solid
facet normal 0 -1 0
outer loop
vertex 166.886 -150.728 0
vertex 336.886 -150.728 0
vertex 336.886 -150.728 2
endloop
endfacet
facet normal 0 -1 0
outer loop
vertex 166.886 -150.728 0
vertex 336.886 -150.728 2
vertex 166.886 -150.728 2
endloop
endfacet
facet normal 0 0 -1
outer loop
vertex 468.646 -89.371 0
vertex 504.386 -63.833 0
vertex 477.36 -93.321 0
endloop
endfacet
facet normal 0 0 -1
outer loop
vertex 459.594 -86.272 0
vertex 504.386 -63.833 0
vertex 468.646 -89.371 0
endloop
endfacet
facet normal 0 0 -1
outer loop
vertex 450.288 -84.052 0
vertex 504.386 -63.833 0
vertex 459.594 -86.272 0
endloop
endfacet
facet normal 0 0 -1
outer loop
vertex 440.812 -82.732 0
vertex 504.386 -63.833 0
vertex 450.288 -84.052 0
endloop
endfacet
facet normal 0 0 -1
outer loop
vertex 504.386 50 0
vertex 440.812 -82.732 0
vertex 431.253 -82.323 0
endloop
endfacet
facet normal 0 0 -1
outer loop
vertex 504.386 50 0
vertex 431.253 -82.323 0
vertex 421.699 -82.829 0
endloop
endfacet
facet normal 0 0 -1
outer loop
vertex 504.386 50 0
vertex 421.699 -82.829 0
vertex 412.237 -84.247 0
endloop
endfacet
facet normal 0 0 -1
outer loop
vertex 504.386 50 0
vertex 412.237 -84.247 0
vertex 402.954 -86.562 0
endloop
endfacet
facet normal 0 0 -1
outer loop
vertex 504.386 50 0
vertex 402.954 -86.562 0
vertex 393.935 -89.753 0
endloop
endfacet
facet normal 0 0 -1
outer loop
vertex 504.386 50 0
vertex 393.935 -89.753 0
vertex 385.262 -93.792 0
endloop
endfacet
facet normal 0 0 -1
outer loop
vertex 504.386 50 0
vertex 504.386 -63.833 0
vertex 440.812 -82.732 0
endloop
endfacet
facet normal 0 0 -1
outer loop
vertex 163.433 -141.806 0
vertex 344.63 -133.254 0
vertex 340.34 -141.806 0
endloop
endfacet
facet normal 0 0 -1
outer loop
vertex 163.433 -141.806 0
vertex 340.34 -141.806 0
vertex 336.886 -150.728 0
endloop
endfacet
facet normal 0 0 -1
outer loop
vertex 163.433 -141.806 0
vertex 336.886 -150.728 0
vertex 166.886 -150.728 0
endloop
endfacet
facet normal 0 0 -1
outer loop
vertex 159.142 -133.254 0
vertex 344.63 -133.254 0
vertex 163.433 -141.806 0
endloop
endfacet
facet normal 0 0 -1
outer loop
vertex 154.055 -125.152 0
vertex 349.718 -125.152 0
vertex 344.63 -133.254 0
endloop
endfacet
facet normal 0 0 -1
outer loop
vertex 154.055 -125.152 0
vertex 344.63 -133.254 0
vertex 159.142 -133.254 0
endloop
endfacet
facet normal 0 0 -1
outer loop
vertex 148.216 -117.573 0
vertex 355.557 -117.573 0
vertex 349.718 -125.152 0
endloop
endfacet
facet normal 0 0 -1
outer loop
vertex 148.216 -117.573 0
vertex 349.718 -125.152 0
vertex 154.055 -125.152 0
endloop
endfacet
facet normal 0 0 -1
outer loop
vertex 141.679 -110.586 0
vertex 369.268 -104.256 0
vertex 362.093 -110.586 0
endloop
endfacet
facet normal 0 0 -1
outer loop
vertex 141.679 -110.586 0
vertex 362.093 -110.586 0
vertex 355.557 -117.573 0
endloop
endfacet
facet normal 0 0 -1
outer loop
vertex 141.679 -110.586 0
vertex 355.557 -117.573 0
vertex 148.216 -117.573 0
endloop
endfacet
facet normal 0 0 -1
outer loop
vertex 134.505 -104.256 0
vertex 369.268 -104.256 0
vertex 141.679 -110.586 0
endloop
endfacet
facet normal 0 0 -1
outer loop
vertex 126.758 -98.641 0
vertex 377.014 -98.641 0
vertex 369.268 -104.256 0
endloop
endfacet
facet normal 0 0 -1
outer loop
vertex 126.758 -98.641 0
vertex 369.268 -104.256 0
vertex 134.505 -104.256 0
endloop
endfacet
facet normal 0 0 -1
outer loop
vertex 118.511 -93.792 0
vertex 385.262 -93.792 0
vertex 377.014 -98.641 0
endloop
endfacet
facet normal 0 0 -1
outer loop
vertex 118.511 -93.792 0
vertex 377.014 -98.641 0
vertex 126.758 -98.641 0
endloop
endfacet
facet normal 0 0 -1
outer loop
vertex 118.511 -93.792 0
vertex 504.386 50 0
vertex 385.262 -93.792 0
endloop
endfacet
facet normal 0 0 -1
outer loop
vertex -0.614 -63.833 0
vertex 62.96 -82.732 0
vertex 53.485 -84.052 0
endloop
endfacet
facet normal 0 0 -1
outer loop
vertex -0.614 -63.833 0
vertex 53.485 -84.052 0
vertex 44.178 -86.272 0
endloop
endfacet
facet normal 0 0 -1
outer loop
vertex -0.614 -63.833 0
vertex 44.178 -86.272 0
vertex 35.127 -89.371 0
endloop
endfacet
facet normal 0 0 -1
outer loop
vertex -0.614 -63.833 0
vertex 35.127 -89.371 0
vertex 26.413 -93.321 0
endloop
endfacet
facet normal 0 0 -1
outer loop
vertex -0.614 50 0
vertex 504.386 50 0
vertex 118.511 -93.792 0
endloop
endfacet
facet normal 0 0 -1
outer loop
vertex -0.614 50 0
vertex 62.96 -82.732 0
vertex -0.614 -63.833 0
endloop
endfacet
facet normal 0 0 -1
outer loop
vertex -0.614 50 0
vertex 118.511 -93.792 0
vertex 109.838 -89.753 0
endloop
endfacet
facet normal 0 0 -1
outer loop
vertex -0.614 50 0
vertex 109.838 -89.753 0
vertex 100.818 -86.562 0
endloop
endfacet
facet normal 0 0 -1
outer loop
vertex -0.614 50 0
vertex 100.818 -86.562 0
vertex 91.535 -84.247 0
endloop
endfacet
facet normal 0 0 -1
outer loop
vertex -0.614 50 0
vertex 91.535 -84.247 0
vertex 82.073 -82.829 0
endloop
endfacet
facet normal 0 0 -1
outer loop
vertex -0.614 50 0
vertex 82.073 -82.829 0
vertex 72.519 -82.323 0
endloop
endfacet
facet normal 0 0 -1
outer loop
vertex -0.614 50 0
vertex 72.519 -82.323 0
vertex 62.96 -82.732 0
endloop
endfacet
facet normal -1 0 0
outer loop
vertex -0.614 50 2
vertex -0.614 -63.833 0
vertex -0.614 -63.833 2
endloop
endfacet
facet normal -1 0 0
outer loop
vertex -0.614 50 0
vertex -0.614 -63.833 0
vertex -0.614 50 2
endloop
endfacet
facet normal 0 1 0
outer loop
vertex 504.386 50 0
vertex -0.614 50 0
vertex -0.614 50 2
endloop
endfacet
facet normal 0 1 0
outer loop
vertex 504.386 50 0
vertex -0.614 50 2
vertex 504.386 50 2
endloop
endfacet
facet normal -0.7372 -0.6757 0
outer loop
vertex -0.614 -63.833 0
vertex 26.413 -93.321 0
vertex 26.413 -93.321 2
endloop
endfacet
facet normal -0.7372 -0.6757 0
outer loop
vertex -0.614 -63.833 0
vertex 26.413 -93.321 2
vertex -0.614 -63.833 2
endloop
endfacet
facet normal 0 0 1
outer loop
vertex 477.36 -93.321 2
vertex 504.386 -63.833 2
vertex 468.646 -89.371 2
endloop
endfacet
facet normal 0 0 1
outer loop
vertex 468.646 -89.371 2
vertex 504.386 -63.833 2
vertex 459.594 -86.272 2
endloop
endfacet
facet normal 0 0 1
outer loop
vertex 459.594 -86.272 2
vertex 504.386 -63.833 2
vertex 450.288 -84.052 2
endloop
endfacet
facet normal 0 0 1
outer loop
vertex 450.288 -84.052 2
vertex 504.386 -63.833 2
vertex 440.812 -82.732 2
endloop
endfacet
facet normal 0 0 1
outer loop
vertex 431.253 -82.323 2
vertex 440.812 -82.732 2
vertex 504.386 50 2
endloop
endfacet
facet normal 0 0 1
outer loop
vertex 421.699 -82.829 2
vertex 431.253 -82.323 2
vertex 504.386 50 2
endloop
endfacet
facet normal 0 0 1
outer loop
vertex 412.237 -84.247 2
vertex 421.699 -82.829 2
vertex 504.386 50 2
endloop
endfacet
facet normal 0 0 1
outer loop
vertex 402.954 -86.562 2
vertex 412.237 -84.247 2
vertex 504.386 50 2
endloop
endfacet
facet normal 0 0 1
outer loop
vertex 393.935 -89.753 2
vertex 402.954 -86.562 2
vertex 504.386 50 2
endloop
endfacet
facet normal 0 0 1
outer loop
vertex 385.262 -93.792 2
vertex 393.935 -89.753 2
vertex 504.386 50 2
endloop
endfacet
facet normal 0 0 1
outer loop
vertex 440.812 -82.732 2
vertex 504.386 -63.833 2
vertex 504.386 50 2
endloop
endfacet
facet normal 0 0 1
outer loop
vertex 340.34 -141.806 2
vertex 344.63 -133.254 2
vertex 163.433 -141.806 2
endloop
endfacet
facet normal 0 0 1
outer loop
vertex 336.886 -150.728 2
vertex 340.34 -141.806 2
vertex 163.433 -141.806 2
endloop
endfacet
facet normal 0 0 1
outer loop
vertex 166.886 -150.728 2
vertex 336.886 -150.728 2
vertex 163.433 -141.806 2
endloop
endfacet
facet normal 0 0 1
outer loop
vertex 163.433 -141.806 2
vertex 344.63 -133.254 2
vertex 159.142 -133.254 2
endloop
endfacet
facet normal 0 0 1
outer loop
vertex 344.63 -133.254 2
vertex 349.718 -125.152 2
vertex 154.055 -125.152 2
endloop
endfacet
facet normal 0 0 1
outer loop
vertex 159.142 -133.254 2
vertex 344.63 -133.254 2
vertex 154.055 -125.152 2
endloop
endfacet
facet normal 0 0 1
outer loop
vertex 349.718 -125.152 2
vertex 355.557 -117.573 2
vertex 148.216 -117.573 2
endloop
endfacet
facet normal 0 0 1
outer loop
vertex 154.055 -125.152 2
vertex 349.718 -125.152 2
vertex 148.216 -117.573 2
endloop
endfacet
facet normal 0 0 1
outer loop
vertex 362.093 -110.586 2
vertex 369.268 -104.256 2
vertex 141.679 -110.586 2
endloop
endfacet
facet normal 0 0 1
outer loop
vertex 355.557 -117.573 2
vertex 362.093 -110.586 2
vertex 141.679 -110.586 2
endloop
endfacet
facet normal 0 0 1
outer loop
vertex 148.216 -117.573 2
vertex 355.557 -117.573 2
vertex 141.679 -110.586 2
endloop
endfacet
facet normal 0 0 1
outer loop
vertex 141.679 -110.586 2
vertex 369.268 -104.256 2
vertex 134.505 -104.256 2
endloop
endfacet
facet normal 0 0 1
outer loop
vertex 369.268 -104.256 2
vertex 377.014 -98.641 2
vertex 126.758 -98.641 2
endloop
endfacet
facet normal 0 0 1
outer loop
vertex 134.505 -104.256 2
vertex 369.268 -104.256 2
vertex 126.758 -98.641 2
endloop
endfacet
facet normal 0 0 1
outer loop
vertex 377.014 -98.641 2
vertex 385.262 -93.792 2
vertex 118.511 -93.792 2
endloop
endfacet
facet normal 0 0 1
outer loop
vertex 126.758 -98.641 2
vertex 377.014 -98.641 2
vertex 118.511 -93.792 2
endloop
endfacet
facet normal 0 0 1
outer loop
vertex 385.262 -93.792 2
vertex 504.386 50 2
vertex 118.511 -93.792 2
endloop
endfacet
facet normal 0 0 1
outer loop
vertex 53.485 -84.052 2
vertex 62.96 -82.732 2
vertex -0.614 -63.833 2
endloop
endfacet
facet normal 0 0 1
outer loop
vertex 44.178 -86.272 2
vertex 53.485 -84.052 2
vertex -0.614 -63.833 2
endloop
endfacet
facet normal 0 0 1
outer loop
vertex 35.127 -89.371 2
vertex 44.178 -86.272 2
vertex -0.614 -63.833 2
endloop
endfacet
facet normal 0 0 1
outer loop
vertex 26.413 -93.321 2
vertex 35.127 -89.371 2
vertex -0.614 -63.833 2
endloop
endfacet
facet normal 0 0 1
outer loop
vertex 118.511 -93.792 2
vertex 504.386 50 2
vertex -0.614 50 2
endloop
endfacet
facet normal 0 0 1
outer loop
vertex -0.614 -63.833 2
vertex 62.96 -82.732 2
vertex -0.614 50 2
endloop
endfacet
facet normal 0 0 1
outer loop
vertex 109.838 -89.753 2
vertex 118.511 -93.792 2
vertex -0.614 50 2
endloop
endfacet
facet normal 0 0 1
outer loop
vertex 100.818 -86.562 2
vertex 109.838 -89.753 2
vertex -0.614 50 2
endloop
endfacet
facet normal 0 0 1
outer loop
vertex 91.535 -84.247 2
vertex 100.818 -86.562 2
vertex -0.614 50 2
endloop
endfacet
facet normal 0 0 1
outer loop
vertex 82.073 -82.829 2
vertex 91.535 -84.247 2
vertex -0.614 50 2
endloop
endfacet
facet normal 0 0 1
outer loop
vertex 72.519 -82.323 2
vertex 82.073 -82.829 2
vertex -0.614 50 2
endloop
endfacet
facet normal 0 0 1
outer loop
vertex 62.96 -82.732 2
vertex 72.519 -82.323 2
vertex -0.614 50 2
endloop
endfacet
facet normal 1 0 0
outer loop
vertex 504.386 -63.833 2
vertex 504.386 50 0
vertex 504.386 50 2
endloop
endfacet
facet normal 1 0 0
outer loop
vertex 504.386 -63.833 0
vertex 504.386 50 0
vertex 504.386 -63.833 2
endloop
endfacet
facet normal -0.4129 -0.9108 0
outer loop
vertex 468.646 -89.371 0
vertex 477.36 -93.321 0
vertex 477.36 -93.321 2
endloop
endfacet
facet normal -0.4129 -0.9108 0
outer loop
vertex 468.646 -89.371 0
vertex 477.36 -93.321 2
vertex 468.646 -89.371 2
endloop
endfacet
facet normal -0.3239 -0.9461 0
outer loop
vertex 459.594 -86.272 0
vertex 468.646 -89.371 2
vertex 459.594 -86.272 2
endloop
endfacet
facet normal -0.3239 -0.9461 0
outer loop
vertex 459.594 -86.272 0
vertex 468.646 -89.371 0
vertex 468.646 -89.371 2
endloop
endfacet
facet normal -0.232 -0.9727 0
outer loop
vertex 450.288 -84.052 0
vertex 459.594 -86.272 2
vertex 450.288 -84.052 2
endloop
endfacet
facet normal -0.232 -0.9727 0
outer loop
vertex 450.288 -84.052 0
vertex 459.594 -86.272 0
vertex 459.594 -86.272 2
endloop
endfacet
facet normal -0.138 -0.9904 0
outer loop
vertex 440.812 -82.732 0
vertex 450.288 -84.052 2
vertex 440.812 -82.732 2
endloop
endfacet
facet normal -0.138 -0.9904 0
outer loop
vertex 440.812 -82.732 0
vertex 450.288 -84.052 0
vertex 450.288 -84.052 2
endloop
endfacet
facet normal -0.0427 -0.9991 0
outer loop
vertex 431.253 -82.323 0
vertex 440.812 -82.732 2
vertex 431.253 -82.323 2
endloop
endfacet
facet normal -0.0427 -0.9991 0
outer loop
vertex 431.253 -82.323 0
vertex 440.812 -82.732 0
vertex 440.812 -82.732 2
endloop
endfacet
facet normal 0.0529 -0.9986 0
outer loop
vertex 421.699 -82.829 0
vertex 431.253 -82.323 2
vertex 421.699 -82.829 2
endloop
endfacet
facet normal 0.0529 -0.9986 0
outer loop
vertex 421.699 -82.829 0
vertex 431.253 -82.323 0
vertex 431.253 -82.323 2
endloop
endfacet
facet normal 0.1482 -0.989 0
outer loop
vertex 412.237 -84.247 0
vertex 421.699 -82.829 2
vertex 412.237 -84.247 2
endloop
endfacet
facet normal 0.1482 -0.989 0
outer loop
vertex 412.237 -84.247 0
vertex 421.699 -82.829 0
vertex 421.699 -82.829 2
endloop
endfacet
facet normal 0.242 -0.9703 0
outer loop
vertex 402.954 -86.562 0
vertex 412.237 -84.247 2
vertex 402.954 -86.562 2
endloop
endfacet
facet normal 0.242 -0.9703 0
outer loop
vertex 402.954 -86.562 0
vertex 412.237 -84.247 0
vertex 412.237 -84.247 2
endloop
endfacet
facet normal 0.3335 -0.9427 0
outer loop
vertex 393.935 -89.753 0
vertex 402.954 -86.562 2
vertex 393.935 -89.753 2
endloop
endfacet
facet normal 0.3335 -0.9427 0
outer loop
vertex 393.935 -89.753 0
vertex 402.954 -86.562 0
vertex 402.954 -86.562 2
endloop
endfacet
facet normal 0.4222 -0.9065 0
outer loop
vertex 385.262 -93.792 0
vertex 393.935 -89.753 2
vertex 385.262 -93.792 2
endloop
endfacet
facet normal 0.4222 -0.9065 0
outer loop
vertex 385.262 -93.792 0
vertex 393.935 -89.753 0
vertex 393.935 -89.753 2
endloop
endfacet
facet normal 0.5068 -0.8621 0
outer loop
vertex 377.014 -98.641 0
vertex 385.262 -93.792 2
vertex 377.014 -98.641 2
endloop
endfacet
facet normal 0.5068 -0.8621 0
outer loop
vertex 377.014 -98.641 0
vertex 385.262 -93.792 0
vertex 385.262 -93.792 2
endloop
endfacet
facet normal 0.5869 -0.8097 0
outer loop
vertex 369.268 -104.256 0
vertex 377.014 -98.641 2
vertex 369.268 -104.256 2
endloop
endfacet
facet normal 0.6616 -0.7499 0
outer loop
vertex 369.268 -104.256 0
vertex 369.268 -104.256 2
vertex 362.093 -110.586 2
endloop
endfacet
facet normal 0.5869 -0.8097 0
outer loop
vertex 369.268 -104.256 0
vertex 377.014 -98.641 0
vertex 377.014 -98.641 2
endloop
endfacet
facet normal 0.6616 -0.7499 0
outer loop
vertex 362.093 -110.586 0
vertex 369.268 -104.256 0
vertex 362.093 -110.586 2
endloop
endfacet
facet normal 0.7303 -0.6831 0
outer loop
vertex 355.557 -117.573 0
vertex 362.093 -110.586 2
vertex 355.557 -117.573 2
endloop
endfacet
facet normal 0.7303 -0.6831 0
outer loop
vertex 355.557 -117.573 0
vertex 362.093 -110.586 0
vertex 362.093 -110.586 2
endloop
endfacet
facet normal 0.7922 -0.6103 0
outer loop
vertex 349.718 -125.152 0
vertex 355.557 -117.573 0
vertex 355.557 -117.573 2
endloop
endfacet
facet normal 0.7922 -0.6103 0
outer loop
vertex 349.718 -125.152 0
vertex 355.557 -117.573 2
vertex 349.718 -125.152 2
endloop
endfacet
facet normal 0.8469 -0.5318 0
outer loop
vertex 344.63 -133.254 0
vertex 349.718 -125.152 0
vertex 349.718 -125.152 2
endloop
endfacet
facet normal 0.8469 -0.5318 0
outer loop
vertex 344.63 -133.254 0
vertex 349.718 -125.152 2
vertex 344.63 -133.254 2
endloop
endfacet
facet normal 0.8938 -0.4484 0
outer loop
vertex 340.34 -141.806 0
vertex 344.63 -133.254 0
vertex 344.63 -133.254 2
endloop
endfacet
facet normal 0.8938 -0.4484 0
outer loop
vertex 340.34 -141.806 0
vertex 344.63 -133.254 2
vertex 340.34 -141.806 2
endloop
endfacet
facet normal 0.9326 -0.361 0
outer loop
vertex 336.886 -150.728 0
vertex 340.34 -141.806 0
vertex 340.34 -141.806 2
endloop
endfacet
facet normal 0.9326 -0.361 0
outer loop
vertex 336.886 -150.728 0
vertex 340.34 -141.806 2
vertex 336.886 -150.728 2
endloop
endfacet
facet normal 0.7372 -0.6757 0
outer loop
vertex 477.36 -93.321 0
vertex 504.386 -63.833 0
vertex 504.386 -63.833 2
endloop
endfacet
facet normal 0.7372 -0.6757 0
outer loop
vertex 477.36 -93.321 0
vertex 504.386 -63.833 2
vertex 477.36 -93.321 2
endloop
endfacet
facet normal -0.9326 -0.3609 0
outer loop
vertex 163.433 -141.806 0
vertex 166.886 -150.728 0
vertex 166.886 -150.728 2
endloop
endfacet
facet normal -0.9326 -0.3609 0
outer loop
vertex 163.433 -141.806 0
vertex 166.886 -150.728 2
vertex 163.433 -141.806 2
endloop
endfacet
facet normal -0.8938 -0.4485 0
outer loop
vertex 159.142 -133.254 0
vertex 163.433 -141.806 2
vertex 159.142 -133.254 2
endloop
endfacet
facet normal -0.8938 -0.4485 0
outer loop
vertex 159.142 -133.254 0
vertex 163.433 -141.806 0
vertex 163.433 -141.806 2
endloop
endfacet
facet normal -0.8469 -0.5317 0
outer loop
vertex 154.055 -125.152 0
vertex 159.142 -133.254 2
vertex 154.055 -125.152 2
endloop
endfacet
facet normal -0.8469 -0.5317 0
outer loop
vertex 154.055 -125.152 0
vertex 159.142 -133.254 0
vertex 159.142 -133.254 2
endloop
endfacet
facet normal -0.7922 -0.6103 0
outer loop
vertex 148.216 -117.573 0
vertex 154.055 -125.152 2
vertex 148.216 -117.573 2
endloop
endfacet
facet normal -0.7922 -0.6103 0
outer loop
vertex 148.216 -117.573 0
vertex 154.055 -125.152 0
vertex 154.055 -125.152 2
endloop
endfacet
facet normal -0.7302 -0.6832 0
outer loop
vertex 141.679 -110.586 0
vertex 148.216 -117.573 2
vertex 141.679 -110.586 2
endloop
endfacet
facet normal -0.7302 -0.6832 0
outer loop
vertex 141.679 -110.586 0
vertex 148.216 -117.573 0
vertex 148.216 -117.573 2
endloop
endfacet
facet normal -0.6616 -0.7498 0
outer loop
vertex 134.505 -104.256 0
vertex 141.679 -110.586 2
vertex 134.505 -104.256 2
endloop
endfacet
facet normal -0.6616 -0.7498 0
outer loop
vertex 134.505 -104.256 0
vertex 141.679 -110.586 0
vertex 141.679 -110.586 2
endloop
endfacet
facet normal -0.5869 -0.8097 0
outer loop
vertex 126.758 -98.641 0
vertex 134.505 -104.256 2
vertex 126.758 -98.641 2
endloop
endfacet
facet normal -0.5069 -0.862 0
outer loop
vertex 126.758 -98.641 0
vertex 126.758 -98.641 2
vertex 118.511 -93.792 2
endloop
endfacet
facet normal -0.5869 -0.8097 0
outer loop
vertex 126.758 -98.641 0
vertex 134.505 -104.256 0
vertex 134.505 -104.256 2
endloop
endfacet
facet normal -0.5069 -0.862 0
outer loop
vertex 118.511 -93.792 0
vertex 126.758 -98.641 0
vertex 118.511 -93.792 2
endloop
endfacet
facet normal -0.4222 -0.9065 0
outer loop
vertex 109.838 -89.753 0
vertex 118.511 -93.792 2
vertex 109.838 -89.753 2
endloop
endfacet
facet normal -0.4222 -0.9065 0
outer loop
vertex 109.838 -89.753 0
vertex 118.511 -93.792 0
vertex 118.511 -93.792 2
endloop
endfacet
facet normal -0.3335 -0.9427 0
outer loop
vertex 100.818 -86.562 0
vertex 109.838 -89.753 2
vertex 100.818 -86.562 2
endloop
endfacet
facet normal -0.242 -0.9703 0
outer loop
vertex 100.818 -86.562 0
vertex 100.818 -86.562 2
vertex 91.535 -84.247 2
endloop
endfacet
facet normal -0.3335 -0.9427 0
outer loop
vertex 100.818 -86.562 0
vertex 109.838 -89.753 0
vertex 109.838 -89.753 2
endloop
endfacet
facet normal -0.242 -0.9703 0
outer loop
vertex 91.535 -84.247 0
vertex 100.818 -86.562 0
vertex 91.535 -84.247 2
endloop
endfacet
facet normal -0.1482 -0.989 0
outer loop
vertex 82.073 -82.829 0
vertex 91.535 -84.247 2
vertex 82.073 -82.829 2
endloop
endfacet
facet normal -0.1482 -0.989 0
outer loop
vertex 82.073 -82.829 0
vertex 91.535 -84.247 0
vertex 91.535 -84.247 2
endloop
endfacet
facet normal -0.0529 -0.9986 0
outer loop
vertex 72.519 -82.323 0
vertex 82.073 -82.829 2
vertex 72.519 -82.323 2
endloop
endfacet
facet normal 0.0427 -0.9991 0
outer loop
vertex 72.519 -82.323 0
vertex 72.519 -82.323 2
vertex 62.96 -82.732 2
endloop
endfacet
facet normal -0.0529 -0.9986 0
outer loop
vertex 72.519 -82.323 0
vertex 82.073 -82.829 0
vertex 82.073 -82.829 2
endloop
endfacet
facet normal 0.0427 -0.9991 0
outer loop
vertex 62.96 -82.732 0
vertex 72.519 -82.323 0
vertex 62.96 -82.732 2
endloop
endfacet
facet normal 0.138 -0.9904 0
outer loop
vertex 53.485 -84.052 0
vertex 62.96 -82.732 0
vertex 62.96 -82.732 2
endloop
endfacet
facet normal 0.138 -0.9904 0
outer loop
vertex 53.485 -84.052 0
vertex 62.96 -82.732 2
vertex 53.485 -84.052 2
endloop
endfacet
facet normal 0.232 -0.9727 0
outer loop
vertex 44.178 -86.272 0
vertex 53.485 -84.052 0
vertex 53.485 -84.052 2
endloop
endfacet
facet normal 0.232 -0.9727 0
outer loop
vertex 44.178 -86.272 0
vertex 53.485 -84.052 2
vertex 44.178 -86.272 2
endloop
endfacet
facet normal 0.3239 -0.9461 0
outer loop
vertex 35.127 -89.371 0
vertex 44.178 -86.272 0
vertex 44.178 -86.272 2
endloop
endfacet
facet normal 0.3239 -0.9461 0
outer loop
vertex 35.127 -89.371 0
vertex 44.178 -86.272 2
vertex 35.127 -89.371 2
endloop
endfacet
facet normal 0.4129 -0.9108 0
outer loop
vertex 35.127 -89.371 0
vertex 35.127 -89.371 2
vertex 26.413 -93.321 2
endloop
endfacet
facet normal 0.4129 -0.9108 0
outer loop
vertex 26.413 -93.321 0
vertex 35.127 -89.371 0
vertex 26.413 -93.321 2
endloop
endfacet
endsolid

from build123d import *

# Parameters (mm, degrees)
BOSS_EXTRUDE1_DEPTH = 2


with BuildPart() as part:
    # Sketch1 → Boss-Extrude1 (new body)
    with BuildSketch(Plane(origin=(0, 0, 0), x_dir=(-1, 0, 0), z_dir=(0, 0, -1))):
        with BuildLine():
            Line((-26.412606162, -93.321181126), (0.613755662, -63.832611026))
            Line((0.613755662, -63.832611026), (0.613755662, 50))
            Line((0.613755662, 50), (-504.386244338, 50))
            Line((-504.386244338, 50), (-504.386244338, -63.832611026))
            Line((-504.386244338, -63.832611026), (-477.359882514, -93.321181126))
            ThreePointArc((-477.359882514, -93.321181126), (-393.934701104, -89.753038855), (-336.886244338, -150.72816586))
            Line((-336.886244338, -150.72816586), (-166.886244338, -150.72816586))
            ThreePointArc((-166.886244338, -150.72816586), (-109.837787572, -89.753038855), (-26.412606162, -93.321181126))
        make_face()
    extrude(amount=-BOSS_EXTRUDE1_DEPTH)


solid = part.part
